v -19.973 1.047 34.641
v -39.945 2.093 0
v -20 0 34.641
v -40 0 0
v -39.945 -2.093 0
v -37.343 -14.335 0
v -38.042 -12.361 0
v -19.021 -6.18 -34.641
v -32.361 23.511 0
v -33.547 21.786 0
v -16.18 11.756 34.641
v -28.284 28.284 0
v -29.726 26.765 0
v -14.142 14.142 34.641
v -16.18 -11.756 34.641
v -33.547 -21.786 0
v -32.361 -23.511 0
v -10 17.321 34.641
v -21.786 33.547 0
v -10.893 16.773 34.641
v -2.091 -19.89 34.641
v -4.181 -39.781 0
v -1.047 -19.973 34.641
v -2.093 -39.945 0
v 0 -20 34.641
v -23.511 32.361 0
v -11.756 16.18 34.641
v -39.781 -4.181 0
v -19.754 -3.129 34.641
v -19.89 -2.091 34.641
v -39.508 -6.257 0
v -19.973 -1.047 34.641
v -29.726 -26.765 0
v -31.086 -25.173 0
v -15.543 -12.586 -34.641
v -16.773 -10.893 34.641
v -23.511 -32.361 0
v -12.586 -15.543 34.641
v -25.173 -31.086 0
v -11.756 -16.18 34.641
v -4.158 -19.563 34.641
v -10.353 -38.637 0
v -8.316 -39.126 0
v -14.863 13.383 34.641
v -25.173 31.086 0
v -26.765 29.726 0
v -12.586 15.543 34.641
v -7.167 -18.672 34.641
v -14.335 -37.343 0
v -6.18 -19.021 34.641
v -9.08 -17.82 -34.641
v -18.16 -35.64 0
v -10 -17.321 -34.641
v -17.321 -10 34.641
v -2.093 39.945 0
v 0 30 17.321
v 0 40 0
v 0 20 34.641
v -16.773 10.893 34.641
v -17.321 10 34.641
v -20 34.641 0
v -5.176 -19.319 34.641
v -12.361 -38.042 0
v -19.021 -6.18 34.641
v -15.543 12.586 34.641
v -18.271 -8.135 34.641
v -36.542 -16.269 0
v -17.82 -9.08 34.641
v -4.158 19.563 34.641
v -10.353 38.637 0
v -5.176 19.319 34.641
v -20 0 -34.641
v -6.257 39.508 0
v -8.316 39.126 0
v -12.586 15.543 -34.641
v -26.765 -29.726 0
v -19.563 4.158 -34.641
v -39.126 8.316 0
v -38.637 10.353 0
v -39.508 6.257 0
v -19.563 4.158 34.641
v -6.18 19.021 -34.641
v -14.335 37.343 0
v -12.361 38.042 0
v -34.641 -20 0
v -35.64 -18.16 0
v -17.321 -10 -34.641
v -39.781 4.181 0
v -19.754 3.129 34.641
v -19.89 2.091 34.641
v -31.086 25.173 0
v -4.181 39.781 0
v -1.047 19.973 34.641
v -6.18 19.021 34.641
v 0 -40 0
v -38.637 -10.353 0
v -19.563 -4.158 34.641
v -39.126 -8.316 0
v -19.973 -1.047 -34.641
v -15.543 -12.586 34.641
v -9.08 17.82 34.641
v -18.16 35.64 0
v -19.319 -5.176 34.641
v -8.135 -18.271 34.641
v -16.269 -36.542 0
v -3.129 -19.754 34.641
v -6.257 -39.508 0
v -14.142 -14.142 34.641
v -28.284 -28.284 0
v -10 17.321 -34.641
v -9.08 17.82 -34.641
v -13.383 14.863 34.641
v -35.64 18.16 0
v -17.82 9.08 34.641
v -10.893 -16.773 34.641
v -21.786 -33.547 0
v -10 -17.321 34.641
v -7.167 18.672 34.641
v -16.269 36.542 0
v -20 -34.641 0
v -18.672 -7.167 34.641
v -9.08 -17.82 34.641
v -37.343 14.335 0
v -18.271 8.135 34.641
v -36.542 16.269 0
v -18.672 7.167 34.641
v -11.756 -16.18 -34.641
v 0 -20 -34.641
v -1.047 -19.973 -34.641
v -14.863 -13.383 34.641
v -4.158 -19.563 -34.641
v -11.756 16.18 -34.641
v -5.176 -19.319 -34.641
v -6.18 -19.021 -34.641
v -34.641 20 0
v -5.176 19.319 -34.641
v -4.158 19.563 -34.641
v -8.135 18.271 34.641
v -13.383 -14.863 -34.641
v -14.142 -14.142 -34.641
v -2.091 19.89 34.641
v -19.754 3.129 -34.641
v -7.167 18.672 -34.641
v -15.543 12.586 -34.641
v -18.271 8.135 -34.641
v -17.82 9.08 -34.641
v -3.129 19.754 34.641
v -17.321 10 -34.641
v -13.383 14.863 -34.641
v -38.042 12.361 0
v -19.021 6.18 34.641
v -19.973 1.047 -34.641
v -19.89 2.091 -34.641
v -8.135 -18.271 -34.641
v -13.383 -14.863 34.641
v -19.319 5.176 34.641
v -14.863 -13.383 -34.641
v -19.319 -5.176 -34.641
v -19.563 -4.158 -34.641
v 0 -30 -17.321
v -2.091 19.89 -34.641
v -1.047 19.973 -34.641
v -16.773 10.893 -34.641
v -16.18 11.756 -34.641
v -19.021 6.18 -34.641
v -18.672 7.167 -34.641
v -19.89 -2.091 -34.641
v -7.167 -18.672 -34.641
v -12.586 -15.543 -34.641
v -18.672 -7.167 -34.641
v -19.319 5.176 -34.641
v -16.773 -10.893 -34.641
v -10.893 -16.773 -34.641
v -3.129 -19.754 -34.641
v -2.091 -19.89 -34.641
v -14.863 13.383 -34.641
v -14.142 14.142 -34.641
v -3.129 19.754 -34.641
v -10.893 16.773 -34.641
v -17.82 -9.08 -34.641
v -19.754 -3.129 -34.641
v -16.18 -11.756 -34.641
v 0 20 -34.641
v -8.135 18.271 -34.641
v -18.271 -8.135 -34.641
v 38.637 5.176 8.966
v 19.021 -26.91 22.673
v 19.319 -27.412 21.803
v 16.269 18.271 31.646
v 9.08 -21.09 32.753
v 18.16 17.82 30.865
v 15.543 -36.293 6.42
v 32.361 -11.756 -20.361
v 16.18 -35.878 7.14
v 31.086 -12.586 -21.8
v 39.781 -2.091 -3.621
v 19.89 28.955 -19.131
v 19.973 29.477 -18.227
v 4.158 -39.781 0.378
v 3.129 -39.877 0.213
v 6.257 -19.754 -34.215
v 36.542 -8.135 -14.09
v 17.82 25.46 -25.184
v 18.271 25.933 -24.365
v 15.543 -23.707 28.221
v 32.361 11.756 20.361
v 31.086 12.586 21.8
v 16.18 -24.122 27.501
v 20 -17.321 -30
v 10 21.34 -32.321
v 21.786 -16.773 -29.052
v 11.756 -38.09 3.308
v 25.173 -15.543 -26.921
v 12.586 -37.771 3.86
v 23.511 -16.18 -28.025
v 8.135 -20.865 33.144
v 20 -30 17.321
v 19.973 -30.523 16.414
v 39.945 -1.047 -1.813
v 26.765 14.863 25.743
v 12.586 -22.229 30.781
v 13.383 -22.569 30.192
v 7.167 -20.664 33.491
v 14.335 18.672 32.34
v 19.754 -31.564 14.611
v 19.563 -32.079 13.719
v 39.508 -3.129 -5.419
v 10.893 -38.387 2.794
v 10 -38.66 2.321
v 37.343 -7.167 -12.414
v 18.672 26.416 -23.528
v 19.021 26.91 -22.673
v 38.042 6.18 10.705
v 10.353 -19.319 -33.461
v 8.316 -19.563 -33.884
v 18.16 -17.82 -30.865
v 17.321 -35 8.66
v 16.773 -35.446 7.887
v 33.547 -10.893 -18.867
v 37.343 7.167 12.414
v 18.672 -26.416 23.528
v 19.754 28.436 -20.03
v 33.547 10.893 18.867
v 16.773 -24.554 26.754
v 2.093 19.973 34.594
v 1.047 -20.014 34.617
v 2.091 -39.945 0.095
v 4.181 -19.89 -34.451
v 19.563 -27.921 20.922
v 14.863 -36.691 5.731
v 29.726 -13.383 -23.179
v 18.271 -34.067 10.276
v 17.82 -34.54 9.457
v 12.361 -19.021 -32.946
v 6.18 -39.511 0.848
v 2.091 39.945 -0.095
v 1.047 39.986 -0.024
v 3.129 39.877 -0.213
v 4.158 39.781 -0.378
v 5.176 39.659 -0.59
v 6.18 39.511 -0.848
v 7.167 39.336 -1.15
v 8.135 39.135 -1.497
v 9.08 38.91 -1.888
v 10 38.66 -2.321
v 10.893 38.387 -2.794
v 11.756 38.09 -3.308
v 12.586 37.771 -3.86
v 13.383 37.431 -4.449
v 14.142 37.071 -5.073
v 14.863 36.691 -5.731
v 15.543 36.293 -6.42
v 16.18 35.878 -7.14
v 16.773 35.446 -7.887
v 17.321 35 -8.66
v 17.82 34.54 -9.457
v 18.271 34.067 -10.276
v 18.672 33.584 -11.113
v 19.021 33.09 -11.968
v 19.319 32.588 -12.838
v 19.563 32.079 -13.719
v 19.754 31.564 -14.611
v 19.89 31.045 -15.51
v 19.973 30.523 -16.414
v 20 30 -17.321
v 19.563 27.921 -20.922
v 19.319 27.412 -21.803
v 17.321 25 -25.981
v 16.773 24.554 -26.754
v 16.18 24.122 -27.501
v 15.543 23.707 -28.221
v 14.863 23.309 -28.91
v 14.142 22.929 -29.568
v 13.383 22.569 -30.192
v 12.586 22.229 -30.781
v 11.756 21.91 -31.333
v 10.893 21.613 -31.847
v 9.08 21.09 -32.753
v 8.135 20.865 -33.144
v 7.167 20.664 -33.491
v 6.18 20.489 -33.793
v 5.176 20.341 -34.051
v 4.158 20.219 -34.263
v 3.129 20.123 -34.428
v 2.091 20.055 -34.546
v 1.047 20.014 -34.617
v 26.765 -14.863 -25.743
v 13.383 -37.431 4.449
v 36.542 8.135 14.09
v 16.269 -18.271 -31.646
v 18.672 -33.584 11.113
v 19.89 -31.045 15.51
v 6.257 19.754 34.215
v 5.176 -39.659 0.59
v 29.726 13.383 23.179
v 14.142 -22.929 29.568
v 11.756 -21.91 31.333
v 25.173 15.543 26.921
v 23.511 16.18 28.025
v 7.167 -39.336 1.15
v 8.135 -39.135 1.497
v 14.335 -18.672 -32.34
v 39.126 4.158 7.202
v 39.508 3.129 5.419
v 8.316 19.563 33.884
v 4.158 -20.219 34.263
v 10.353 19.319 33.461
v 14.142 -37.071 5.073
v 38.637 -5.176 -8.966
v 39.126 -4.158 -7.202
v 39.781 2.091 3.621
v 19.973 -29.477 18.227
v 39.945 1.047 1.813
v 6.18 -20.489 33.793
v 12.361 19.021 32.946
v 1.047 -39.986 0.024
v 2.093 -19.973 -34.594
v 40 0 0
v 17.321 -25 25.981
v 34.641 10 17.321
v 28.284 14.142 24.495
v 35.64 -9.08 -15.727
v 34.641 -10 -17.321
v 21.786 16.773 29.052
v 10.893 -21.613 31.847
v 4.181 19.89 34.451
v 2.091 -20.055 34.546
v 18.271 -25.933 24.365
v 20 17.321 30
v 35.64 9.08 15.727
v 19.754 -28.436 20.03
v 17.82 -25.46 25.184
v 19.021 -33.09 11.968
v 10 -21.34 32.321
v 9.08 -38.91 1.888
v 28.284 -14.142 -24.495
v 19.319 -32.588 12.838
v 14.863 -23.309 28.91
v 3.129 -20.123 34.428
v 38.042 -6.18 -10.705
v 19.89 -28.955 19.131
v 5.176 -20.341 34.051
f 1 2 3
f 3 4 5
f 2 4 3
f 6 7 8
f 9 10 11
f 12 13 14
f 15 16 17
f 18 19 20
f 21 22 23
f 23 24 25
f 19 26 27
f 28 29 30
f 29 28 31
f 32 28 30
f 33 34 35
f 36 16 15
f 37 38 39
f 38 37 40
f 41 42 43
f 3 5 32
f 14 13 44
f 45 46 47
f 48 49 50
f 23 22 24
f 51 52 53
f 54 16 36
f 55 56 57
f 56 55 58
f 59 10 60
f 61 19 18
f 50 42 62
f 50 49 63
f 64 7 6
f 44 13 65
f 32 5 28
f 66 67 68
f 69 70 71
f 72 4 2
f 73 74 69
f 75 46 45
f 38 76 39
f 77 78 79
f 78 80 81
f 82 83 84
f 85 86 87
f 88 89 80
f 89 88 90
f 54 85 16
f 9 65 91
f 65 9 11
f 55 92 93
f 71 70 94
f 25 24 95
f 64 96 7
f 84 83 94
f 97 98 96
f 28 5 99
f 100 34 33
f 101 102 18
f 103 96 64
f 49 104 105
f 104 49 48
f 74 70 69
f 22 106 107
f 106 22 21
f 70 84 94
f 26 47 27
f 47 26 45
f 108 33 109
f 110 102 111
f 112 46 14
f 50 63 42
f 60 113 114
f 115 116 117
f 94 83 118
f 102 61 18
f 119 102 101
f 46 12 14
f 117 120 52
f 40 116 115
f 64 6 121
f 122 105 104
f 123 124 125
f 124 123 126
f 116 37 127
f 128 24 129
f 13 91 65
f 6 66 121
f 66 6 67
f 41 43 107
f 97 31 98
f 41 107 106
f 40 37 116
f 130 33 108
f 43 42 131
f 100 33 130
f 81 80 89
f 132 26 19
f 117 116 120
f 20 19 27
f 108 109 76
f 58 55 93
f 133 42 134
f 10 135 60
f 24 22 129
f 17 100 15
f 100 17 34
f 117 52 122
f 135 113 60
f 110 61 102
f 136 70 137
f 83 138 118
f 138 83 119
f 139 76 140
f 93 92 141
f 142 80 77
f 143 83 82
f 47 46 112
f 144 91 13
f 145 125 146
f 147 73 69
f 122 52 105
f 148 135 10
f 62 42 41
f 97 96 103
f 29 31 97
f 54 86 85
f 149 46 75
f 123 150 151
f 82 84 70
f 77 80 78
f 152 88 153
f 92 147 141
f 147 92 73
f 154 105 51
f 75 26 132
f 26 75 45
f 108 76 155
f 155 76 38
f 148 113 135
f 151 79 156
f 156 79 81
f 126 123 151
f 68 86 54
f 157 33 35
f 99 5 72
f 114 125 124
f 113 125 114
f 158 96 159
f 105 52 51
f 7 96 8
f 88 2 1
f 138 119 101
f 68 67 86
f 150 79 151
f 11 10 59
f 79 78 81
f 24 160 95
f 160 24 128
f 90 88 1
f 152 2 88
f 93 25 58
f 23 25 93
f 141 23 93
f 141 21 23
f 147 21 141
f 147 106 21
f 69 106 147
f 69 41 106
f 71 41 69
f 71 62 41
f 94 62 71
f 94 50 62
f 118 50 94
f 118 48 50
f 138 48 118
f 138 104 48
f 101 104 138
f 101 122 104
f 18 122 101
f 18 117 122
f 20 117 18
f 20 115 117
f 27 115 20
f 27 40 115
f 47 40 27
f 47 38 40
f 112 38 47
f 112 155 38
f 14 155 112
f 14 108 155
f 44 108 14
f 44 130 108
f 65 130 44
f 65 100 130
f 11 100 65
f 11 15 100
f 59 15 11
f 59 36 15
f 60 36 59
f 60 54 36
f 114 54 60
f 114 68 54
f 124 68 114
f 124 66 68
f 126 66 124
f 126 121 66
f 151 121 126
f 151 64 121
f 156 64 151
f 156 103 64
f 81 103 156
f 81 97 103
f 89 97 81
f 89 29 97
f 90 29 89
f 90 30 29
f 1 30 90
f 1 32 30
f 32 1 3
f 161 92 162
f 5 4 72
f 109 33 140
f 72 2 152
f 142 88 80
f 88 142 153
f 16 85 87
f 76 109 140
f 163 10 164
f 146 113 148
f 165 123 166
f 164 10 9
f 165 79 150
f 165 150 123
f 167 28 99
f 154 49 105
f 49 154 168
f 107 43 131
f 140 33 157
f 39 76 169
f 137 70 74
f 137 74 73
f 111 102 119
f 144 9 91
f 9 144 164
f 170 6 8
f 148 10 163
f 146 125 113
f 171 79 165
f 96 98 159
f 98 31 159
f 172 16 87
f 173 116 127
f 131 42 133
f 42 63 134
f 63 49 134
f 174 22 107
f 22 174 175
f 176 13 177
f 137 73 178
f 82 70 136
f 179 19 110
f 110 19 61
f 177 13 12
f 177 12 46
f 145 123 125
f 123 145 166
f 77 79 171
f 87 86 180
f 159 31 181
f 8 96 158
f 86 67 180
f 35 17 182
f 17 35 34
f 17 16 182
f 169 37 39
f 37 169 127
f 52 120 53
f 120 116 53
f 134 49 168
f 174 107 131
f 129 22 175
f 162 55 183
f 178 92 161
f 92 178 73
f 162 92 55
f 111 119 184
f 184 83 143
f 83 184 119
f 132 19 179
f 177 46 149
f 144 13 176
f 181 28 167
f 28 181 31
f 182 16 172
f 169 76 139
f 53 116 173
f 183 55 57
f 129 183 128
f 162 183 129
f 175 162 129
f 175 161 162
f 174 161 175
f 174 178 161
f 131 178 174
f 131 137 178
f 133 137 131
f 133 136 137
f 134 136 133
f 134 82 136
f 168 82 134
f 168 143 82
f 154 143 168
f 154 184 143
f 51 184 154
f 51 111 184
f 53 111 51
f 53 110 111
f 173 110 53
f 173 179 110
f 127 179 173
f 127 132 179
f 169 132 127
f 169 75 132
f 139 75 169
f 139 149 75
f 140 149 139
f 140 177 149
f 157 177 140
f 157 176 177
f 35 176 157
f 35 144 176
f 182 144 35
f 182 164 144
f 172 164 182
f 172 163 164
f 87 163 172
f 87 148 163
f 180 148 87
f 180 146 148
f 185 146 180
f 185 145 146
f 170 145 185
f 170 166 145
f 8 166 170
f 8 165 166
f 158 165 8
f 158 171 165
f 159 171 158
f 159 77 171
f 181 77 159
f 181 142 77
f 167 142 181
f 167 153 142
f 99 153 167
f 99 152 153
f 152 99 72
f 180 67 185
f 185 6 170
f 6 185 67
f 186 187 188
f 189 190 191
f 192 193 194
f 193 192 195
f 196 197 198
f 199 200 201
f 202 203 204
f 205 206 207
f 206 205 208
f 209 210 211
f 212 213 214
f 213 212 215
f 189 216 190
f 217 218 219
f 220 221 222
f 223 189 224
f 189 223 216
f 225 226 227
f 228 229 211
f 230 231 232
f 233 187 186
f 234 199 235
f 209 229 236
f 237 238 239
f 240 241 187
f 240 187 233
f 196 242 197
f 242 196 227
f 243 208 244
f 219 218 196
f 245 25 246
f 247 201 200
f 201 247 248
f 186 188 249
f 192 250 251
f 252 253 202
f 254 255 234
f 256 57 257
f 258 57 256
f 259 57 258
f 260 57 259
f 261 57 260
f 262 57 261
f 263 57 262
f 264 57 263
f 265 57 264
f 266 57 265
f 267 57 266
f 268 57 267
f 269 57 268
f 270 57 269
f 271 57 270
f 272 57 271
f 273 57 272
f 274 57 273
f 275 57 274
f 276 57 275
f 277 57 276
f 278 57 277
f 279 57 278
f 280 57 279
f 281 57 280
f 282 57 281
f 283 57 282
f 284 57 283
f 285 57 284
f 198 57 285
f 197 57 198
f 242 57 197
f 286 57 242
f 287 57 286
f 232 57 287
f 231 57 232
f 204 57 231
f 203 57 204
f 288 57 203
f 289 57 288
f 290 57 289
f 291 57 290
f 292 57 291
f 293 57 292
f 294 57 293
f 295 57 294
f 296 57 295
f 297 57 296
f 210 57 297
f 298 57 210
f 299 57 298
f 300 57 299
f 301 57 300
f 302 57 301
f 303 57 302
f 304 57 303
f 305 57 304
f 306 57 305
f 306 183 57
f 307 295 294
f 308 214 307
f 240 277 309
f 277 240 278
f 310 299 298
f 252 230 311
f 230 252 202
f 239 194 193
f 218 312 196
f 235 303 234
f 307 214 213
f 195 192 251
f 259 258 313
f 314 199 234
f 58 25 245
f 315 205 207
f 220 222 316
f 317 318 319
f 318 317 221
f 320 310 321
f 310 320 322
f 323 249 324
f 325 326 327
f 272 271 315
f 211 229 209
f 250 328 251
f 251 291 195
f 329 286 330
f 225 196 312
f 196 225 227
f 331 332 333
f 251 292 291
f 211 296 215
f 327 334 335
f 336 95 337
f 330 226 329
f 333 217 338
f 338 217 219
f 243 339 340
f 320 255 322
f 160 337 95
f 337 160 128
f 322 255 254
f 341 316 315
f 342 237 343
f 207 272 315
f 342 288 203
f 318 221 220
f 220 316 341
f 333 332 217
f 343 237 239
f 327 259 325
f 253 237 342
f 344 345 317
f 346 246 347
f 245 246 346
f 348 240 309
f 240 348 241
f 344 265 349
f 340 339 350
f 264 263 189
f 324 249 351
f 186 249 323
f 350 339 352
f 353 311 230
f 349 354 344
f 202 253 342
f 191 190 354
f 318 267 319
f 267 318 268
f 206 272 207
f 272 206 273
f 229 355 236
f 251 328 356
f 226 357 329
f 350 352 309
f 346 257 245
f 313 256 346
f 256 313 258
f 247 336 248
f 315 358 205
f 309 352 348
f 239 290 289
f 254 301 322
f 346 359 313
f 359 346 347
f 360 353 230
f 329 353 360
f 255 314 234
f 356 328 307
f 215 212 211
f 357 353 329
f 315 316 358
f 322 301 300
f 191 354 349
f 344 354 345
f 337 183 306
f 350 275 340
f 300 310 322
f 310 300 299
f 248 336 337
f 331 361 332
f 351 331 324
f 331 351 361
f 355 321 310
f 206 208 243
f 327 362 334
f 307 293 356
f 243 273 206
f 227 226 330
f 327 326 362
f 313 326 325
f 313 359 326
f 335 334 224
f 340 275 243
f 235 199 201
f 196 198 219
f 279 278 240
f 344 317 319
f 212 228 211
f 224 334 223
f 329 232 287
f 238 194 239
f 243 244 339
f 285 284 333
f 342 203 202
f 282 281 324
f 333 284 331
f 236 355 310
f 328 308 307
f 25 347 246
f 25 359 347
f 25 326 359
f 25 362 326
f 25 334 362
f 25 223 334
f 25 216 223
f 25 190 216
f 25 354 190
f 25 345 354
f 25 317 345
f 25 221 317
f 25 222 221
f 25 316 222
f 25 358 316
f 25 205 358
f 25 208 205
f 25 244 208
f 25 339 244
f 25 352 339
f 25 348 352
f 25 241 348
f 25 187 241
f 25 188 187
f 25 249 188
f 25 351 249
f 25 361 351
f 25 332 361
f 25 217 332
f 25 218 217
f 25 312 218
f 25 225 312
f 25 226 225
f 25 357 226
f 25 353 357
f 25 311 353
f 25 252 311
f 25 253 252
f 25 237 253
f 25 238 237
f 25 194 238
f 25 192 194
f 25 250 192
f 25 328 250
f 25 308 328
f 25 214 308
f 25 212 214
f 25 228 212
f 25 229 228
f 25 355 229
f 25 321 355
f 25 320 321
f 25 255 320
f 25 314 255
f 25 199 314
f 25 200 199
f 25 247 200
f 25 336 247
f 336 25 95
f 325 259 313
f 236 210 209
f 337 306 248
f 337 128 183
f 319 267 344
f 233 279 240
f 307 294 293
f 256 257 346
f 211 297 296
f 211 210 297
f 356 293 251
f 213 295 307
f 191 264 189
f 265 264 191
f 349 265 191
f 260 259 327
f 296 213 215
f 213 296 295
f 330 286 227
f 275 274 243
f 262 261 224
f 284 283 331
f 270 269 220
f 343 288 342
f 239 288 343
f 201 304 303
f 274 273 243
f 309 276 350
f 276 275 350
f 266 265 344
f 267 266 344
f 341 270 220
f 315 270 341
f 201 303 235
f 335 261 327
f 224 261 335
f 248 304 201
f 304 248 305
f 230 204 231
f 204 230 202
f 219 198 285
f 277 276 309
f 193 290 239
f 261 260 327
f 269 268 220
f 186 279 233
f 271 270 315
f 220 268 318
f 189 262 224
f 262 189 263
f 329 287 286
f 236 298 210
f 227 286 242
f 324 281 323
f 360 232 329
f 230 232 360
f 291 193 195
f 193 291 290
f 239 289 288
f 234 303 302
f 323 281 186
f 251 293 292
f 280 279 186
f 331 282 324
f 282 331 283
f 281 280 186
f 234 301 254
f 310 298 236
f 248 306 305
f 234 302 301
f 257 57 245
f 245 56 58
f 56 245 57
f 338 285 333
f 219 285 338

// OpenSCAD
RADIUS = 40;
SIDES  = 6;

module positive_x_plane(){
    polygon([
        [0, -RADIUS],
        [0, RADIUS],
        [RADIUS, RADIUS],
        [RADIUS, -RADIUS]
    ]);
}

module negative_x_space(){
    translate([-RADIUS/2, 0, 0])
        cube([RADIUS, RADIUS*2, RADIUS*2], true);
}

module positive_x_space(){
    mirror([1, 0, 0]) negative_x_space();
}

module base_shape(){
    rotate_extrude($fn = 120)
    intersection(){
        circle(r = RADIUS, $fn = SIDES);
        positive_x_plane();
    }
}

module sphericon(){
    // the part of the shape in negative x space
    // remains unchanged.
    intersection(){
        base_shape();
        negative_x_space();
    }
    
    // the part of the shape in positive x space
    // gets rotated around x by 360 degress / SIDES
    rotate([360/SIDES, 0, 0])
    intersection(){
        base_shape();
        positive_x_space();
    }
}

sphericon();
